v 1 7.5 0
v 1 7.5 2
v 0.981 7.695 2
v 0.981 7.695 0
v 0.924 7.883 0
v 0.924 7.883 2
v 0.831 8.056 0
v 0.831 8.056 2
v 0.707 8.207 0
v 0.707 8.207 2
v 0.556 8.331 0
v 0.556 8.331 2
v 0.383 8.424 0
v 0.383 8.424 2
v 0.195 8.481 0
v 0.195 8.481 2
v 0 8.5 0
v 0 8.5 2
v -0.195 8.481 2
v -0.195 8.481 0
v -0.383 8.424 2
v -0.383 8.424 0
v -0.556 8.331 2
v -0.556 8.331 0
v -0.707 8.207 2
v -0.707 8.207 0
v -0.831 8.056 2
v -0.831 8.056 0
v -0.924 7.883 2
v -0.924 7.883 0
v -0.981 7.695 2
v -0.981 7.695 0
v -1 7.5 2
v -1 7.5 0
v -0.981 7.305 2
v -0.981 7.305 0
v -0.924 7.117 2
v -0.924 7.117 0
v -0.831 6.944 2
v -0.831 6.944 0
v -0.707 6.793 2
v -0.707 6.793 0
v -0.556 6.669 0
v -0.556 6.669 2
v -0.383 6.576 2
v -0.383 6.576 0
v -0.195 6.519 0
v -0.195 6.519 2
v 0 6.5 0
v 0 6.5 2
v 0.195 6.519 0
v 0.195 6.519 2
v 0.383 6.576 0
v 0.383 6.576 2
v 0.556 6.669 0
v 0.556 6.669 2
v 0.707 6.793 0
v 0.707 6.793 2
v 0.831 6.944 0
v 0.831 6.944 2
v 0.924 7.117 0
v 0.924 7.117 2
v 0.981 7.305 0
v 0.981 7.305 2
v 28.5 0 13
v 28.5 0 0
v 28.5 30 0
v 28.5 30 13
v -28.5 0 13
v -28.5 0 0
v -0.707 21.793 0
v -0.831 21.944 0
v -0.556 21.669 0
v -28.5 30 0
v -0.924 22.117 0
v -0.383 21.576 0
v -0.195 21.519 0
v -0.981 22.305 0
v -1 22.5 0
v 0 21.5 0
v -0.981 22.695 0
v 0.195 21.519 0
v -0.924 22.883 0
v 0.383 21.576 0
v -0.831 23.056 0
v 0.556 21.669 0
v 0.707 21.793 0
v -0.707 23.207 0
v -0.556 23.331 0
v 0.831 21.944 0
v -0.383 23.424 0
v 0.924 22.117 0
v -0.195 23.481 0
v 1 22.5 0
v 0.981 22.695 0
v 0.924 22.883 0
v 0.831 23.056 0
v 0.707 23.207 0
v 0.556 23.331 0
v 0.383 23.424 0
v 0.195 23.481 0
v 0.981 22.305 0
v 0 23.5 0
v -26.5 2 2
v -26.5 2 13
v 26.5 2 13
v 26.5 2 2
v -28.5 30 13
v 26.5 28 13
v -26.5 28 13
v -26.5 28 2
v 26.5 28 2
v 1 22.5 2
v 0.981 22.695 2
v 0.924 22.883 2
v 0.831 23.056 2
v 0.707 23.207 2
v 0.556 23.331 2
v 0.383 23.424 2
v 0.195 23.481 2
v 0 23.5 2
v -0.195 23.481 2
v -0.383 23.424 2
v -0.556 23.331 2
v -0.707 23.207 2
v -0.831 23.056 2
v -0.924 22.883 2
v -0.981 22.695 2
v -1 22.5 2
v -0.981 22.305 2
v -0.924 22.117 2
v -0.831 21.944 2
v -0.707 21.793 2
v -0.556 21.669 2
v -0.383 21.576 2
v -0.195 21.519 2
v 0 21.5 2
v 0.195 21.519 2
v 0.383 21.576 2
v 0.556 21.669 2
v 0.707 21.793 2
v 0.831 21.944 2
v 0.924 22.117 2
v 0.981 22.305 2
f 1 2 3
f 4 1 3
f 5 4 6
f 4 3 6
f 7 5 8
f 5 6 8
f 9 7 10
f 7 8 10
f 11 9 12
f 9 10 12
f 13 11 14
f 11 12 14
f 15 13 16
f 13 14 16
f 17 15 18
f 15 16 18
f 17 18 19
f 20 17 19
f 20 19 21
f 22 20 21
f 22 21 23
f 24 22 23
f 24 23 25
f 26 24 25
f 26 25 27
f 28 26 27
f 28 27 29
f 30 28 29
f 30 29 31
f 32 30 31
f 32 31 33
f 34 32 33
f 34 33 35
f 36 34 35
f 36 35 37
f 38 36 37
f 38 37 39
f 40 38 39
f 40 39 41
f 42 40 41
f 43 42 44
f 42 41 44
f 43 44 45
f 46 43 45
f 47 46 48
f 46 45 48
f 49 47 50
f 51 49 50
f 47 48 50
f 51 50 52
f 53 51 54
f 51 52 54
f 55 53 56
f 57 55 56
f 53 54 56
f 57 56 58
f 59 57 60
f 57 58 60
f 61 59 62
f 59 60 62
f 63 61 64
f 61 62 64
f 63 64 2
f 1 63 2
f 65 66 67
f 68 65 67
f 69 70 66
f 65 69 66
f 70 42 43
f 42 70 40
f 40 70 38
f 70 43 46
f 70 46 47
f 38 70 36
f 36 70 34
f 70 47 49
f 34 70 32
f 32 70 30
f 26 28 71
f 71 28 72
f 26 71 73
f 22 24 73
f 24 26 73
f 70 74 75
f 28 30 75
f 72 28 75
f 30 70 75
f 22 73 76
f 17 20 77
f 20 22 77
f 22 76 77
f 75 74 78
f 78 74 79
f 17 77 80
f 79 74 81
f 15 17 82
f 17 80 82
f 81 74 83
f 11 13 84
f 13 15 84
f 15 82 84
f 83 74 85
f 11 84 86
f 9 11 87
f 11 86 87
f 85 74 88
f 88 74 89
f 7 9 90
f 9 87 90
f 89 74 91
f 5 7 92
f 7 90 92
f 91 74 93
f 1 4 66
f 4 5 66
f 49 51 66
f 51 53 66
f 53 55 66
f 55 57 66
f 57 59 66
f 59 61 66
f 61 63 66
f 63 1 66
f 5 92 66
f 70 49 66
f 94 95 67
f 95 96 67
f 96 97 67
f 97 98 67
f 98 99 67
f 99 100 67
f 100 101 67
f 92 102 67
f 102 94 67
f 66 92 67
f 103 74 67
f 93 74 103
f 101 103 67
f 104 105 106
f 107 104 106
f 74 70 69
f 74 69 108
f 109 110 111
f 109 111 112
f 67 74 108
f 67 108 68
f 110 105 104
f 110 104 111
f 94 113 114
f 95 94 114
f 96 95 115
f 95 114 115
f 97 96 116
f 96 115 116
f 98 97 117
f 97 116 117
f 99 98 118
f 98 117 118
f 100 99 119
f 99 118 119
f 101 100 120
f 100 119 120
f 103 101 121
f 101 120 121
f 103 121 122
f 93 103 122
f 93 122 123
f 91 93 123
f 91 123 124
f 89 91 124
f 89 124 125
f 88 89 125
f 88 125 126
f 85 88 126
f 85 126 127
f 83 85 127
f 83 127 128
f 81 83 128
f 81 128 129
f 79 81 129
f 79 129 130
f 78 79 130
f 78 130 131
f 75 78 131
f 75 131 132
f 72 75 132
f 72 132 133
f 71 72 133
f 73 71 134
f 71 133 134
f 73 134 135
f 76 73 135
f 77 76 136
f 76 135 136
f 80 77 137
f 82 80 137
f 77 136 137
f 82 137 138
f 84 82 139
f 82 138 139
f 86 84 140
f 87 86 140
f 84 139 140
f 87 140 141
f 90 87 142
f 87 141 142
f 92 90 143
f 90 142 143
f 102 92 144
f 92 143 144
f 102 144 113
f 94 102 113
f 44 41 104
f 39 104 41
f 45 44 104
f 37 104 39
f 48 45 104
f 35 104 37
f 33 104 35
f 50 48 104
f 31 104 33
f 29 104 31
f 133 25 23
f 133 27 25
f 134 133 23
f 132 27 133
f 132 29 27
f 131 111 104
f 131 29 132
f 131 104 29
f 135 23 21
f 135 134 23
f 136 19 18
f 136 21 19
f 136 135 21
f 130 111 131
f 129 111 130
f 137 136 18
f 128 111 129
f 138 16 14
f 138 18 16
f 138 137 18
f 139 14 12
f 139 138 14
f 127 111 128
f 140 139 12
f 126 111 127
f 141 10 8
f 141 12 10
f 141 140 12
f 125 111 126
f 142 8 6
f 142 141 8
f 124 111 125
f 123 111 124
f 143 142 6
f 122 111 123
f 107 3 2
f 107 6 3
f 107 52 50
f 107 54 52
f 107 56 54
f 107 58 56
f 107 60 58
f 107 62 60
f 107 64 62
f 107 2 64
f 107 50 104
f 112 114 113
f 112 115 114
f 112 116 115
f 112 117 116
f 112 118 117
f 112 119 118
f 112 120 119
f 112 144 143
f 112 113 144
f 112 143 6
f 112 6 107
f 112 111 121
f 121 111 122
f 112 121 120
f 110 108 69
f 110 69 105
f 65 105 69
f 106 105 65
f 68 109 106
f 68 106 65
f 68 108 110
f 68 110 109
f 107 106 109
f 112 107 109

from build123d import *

# Parameters (mm, degrees)
SKETCH_W        = 57
SKETCH_H        = 30
PAD_DEPTH       = 13
SKETCH001_W     = 53
SKETCH001_H     = 26
POCKET_DEPTH    = 11
SKETCH002_R     = 1
POCKET001_DEPTH = 2.001


with BuildPart() as part:
    # Sketch → Pad (new body)
    with BuildSketch(Plane.XY):
        with Locations((0, 15)):
            Rectangle(SKETCH_W, SKETCH_H)
    extrude(amount=PAD_DEPTH)

    # Sketch001 (on Face6 of Pad) → Pocket (cut)
    with BuildSketch(Plane.XY.offset(13)):
        with Locations((0, 15)):
            Rectangle(SKETCH001_W, SKETCH001_H)
    extrude(amount=-POCKET_DEPTH, mode=Mode.SUBTRACT)

    # Sketch002 (on Face11 of Pocket) → Pocket001 (cut, through all)
    with BuildSketch(Plane.XY.offset(2)):
        with Locations((0, 22.5)):
            Circle(SKETCH002_R)
        with Locations((0, 7.5)):
            Circle(SKETCH002_R)
    extrude(amount=-POCKET001_DEPTH, mode=Mode.SUBTRACT)


solid = part.part
